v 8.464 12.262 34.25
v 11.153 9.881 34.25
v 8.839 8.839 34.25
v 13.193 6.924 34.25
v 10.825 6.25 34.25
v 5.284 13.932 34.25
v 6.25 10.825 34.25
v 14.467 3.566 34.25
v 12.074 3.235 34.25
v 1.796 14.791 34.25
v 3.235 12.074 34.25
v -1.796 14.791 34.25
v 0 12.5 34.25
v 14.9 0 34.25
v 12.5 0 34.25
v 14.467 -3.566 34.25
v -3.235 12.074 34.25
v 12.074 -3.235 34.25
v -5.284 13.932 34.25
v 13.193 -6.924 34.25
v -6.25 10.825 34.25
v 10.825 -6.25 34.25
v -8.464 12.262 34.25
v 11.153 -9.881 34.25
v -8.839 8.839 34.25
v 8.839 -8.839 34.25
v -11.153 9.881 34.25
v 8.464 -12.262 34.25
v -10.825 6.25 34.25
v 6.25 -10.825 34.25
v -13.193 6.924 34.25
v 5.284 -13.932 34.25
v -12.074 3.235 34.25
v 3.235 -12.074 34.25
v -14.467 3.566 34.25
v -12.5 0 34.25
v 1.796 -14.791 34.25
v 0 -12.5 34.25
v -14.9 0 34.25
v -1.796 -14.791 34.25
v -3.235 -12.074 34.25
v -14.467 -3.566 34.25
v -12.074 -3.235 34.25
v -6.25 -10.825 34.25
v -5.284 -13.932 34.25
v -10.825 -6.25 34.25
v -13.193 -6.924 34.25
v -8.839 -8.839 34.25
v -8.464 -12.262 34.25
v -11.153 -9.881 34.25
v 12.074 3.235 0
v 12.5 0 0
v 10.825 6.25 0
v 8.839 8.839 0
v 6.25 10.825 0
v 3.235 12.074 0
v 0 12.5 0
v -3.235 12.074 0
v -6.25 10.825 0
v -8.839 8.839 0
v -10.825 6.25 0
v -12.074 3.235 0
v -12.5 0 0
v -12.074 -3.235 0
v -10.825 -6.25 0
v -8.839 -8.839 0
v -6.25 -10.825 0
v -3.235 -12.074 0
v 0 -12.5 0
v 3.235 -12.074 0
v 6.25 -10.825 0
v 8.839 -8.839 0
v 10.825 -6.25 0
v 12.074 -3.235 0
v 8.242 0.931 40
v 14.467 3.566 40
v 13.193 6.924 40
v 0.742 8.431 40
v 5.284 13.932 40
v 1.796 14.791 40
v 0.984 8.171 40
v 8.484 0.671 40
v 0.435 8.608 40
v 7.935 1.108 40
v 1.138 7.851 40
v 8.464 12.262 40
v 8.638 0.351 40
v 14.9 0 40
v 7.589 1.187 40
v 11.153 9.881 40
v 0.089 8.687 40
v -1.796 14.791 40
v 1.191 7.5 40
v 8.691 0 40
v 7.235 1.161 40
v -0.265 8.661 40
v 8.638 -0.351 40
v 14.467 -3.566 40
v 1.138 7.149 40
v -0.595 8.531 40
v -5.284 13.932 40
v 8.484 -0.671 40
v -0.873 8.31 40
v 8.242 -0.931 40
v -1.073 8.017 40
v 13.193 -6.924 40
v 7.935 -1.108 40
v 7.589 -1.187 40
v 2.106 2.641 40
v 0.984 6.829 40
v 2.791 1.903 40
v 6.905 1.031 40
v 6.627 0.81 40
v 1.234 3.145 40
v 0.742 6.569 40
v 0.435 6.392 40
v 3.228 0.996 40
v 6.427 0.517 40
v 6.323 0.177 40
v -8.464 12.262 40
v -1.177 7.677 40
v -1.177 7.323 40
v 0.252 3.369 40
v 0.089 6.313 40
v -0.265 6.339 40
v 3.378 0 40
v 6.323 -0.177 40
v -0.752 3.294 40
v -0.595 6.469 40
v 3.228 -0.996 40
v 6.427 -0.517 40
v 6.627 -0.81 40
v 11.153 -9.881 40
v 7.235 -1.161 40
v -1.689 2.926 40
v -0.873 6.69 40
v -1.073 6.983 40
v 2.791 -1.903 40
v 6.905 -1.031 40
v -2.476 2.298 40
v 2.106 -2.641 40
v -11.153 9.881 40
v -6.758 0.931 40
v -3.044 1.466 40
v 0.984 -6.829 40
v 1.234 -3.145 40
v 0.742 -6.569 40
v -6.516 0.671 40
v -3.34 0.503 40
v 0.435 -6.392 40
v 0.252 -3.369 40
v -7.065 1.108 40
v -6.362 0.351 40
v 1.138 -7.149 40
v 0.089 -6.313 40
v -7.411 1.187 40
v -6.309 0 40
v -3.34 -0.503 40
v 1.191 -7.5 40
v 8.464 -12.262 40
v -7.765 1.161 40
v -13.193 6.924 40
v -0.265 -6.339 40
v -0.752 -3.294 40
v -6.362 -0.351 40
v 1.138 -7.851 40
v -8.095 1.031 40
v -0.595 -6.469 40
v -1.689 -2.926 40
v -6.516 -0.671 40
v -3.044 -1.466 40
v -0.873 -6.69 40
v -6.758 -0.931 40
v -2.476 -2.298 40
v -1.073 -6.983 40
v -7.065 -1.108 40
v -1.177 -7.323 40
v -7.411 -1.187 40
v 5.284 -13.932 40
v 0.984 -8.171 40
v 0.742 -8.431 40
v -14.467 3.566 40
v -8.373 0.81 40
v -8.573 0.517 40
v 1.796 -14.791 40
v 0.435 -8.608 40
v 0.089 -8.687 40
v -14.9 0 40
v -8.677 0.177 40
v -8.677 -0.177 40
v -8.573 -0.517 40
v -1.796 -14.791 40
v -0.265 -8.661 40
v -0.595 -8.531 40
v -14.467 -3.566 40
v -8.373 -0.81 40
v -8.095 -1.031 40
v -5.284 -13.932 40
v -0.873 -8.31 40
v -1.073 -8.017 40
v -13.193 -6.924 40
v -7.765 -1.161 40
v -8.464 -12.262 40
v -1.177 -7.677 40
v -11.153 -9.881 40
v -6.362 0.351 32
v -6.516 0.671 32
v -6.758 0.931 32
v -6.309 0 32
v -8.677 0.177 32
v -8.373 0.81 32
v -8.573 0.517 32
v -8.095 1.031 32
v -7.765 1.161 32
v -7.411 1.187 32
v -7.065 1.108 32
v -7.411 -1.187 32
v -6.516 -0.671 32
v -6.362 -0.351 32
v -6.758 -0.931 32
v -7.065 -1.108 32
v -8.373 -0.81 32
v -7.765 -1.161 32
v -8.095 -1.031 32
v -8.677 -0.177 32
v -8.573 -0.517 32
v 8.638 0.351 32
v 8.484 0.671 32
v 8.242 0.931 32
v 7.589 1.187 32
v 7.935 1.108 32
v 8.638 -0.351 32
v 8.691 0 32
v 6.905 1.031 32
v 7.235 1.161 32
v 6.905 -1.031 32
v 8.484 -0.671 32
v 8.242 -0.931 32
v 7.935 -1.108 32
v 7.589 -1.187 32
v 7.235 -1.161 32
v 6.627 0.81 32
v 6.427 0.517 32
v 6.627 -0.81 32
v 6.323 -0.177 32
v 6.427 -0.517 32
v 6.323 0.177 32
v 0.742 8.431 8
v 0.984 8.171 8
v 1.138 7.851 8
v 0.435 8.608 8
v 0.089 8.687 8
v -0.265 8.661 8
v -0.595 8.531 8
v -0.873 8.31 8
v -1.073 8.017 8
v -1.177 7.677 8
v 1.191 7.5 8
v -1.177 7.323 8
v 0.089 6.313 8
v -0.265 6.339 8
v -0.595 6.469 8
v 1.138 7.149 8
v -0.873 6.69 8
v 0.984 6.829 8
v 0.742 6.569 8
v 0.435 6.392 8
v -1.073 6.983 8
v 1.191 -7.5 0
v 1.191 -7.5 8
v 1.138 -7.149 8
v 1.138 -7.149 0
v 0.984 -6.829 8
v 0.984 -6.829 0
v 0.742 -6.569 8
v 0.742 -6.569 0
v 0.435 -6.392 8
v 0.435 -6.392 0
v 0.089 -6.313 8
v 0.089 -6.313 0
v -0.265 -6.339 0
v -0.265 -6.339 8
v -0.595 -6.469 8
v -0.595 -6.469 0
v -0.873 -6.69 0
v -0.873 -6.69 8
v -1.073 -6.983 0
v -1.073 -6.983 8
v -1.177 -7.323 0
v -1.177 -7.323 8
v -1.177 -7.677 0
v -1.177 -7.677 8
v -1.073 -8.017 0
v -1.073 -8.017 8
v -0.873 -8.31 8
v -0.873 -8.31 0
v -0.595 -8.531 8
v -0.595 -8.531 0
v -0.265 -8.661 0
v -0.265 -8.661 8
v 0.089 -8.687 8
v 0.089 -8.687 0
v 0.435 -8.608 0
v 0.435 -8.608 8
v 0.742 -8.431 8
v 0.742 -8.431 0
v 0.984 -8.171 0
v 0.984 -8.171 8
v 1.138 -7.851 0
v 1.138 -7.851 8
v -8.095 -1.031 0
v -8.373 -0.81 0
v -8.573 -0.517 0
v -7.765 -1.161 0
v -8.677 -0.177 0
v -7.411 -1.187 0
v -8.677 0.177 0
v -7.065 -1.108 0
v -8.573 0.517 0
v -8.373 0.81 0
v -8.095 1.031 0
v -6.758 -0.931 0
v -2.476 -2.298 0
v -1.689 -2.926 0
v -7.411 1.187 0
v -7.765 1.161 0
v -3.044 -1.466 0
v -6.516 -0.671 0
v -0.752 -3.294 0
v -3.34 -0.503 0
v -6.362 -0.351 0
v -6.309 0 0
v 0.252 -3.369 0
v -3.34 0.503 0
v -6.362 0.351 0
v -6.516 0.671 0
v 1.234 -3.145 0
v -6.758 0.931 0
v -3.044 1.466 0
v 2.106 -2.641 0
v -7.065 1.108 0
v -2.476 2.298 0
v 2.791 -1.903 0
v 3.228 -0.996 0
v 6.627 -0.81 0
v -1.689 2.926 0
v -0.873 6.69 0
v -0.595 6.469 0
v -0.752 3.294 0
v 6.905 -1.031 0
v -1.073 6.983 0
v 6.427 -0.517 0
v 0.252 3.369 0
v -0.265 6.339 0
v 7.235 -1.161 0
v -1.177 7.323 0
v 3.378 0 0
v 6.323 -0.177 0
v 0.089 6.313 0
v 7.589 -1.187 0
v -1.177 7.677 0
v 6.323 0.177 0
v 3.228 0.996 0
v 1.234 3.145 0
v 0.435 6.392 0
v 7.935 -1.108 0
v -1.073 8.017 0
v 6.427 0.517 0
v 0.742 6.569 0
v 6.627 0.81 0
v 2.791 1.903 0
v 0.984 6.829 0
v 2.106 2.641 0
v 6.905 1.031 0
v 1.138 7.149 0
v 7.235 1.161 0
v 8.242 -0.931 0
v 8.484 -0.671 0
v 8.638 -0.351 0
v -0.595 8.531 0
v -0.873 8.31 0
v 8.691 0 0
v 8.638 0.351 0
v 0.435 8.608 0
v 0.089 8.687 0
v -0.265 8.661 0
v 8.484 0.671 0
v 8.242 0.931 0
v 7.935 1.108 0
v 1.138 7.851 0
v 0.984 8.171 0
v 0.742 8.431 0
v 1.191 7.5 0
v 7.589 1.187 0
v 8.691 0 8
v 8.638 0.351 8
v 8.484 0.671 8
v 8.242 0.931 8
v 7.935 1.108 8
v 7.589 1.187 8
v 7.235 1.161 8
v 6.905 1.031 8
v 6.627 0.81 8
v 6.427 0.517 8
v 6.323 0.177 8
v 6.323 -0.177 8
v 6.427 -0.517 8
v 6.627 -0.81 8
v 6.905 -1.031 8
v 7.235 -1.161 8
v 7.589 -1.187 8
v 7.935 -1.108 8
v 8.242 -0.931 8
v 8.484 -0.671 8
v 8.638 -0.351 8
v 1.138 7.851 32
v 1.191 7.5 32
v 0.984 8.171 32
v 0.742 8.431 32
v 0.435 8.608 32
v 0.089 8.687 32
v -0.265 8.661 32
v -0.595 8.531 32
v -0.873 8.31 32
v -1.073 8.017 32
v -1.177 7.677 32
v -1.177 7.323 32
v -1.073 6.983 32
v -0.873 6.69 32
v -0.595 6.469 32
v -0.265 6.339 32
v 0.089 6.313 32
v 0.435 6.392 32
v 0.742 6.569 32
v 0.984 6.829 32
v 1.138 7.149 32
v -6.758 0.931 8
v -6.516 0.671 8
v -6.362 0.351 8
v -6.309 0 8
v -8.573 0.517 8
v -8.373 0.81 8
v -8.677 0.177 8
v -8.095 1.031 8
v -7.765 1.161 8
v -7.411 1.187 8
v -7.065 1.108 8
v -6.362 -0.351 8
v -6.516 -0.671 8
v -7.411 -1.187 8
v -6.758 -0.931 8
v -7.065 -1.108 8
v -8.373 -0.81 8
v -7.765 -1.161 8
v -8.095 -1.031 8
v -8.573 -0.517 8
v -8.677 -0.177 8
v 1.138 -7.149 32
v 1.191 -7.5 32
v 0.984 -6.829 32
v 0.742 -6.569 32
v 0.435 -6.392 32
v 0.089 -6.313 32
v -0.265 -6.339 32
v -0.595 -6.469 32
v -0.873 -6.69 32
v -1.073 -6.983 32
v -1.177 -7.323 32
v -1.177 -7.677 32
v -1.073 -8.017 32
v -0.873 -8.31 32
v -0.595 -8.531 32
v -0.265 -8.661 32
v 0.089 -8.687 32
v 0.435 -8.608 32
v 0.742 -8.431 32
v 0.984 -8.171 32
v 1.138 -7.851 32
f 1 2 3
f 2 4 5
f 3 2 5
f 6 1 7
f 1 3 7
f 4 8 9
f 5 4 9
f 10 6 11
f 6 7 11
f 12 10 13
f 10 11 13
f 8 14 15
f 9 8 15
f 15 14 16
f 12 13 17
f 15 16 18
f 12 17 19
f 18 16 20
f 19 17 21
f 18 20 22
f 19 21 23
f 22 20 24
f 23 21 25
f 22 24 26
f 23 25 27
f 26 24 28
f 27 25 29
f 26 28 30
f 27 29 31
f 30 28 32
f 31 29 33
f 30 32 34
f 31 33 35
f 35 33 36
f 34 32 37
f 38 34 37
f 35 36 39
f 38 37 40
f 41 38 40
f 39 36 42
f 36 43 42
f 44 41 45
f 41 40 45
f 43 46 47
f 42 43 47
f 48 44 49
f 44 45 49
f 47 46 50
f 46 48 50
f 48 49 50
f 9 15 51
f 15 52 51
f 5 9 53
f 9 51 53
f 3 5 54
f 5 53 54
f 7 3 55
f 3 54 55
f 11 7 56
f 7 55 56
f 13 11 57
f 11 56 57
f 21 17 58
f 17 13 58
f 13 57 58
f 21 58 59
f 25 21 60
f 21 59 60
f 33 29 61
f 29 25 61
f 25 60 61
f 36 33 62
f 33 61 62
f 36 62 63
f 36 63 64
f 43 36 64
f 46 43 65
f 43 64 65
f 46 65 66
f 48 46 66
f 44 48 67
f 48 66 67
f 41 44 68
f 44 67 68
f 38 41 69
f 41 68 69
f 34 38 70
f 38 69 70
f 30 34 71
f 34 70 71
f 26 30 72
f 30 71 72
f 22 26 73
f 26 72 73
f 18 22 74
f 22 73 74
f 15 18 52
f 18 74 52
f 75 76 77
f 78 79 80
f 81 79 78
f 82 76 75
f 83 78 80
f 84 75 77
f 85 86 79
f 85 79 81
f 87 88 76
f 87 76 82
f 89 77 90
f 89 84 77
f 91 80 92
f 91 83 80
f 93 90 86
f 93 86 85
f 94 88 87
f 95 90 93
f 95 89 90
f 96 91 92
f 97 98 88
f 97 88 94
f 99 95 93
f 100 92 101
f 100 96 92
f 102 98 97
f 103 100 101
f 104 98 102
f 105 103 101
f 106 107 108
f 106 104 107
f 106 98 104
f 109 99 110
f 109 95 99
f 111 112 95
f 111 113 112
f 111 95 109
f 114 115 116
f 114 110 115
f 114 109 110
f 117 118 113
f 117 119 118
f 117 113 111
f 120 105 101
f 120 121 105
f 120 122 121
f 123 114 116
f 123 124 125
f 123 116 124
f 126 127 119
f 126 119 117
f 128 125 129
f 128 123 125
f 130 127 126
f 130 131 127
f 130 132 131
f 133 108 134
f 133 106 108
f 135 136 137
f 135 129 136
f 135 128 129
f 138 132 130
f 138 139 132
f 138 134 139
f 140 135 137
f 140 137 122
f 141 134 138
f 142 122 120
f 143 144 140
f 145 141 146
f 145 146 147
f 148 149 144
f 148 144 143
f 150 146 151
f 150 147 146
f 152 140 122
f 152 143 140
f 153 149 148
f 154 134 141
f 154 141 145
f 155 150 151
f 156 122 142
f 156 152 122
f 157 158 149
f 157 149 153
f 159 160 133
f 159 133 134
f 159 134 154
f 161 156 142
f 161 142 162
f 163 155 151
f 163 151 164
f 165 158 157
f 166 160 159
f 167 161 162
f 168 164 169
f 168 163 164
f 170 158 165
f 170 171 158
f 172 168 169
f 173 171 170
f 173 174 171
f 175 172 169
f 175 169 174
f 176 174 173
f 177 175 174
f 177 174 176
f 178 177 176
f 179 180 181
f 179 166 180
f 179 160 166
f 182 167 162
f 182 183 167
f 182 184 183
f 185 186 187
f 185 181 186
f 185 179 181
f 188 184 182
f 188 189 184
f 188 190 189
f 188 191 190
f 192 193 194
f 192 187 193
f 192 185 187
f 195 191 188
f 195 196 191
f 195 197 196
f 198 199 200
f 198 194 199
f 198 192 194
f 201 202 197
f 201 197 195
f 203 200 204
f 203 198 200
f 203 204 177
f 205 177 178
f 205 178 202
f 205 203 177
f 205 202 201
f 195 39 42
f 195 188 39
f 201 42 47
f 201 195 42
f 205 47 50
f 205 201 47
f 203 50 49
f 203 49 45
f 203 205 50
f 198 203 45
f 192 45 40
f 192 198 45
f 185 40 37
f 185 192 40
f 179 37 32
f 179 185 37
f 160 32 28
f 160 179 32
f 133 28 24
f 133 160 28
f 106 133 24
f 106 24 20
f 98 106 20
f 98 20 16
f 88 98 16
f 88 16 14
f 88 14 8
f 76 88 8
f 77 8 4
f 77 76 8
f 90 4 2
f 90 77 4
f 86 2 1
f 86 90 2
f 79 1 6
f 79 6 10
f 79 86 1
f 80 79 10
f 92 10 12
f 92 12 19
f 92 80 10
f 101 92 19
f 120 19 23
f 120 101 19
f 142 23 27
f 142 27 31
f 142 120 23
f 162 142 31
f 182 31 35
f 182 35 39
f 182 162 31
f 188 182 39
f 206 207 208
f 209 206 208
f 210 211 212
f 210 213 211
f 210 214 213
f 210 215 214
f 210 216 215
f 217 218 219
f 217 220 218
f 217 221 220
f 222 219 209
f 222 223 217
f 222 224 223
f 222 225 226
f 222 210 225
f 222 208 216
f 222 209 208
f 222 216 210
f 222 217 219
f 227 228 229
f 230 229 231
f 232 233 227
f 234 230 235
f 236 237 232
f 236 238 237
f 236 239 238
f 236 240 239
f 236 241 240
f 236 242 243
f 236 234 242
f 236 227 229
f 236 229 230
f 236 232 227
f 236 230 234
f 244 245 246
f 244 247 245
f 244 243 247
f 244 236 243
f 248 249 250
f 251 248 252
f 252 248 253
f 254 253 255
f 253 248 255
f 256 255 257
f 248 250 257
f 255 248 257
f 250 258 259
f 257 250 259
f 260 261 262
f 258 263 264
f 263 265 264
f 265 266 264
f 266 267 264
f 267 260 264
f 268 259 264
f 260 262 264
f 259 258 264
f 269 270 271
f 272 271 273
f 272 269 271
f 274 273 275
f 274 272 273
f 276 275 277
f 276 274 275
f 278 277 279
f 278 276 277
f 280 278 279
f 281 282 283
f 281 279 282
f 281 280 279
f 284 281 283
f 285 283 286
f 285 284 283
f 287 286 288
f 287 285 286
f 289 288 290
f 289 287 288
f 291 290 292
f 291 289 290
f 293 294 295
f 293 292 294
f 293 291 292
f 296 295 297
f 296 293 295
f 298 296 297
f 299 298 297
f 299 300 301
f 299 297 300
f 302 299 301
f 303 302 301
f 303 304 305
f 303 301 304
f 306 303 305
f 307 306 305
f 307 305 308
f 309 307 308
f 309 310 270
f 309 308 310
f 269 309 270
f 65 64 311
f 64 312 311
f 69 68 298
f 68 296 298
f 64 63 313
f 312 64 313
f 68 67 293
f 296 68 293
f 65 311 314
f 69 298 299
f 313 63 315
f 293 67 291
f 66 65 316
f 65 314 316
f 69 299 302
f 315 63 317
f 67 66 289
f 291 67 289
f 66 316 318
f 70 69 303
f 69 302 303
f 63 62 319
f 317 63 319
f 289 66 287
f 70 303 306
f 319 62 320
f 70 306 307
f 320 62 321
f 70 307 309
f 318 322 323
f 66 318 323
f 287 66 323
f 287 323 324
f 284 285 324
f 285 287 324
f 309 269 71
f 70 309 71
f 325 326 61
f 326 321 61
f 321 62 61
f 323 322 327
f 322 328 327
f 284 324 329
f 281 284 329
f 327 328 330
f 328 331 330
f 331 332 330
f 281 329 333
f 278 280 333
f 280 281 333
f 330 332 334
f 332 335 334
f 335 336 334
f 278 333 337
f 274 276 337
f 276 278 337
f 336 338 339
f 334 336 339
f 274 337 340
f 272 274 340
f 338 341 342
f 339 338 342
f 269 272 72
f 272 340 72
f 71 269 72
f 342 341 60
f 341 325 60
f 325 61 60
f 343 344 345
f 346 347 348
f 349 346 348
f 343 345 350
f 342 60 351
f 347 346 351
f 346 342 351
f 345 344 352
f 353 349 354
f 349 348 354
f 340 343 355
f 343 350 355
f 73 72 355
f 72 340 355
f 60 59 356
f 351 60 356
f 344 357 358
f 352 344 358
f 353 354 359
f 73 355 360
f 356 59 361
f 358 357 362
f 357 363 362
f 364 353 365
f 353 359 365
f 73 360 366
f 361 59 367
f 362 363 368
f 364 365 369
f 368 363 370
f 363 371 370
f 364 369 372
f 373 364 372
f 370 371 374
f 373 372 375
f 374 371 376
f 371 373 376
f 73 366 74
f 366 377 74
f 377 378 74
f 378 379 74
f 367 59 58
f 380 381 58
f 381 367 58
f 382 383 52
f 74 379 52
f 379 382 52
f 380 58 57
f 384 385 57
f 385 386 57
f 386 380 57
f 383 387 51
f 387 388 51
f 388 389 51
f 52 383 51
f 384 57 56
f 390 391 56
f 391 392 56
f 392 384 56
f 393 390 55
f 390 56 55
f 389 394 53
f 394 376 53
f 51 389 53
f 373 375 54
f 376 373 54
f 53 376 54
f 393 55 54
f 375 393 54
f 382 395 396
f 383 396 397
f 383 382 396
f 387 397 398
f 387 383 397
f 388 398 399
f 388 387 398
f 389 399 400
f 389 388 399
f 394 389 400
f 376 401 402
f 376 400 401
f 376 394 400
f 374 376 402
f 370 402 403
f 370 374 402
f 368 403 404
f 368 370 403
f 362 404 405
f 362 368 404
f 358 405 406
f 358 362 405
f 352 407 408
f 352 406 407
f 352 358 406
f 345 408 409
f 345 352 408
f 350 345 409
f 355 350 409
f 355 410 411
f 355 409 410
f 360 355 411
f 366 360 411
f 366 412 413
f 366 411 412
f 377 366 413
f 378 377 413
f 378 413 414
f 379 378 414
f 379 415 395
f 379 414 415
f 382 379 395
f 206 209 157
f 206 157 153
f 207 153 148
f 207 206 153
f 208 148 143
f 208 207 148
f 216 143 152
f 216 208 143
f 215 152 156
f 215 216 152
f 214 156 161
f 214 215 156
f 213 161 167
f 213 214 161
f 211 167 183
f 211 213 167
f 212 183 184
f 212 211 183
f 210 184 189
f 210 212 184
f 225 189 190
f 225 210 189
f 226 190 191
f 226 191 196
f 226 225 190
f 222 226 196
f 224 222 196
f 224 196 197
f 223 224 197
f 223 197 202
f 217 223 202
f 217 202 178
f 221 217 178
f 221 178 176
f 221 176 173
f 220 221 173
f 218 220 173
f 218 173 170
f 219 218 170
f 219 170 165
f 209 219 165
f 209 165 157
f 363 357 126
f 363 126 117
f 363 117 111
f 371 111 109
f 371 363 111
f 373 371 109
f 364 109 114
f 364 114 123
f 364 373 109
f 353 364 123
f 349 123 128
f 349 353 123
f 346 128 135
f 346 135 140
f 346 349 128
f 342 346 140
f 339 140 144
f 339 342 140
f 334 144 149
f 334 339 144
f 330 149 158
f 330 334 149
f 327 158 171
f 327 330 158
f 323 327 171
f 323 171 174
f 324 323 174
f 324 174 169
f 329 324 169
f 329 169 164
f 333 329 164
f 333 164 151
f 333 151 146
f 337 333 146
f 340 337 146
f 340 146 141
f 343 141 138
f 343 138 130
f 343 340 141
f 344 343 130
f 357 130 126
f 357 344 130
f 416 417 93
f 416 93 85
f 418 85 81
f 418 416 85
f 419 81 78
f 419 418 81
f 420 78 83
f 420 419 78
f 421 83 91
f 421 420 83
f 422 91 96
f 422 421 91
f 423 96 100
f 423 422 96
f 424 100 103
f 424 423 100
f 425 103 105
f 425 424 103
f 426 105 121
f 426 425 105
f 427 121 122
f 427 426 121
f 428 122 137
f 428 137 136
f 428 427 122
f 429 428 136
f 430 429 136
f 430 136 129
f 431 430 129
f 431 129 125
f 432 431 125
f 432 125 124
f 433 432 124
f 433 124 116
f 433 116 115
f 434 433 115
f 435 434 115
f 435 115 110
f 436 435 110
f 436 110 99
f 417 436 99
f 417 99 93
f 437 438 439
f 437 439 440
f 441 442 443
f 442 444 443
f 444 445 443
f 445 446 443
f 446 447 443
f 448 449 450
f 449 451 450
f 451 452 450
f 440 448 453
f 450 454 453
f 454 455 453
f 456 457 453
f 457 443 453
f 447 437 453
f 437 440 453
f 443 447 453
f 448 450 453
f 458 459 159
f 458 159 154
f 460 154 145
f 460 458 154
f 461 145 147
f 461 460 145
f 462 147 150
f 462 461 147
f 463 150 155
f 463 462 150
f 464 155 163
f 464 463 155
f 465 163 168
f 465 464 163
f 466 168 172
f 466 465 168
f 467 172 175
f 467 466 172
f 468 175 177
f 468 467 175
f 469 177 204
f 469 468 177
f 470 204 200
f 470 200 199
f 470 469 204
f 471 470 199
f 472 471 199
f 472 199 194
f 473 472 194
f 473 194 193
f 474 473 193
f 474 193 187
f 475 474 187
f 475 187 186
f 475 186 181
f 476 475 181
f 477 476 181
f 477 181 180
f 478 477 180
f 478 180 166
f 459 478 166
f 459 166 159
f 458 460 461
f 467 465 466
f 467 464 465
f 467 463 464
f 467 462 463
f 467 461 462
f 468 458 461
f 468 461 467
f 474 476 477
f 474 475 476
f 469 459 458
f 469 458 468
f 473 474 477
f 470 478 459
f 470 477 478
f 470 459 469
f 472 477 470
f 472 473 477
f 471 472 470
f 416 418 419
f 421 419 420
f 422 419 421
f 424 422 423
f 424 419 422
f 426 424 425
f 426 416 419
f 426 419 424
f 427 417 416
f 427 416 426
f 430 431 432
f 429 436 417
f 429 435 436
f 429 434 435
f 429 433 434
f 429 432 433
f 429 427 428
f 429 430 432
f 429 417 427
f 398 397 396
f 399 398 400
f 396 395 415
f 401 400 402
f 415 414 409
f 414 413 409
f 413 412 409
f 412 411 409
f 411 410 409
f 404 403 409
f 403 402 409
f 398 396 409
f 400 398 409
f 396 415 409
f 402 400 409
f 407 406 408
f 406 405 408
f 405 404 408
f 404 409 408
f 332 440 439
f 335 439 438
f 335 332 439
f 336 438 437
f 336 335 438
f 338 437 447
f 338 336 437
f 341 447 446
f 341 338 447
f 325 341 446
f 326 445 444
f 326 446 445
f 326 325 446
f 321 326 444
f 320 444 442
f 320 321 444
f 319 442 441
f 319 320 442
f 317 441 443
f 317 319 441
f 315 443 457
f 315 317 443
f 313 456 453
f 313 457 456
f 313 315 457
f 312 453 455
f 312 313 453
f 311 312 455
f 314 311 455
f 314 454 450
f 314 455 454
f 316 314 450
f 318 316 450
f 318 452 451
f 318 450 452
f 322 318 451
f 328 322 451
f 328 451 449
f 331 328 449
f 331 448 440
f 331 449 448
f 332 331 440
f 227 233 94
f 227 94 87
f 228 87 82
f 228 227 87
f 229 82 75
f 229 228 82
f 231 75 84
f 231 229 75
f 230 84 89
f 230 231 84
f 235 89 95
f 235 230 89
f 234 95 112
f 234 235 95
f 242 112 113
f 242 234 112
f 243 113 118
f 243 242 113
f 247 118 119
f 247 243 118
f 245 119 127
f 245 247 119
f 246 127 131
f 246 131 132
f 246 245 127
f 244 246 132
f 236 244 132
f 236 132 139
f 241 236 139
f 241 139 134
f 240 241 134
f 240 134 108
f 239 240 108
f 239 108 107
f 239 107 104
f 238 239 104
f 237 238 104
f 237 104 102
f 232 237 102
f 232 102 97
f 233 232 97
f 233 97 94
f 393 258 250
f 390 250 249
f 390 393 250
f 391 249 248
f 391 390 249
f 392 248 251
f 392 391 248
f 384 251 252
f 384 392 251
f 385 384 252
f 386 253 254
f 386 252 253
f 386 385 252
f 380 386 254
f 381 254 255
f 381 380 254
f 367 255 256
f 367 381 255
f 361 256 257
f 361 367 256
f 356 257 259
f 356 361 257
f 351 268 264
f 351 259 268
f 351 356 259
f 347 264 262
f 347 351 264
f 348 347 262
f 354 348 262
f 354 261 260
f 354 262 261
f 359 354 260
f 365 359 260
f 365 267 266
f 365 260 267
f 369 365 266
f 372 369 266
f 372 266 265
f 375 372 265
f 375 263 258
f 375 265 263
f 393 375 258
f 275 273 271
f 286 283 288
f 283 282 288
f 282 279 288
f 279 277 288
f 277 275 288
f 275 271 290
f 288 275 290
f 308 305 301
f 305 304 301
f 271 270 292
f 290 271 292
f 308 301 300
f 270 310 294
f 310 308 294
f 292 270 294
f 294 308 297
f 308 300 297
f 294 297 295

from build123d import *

# Parameters (mm, degrees)
SKETCH1_R           = 12.5
SKETCH1_R_2         = 1.190625
SKETCH1_R_3         = 3.3782
BOSS_EXTRUDE1_DEPTH = 40
SKETCH2_W           = 7.5
SKETCH2_H           = 24
SKETCH2_W_2         = 2.4
SKETCH2_H_2         = 5.75


with BuildPart() as part:
    # Sketch1 → Boss-Extrude1 (new body)
    with BuildSketch(Plane(origin=(0, 0, 0), x_dir=(0, 1, 0), z_dir=(0, 0, 1))):
        with Locations(Location((0, 0, 0), (0, 0, 270))):
            Circle(SKETCH1_R)
        with Locations(Location((0, -7.5, 0), (0, 0, 270))):
            Circle(SKETCH1_R_2, mode=Mode.SUBTRACT)
        with Locations(Location((7.5, 0, 0), (0, 0, 270))):
            Circle(SKETCH1_R_2, mode=Mode.SUBTRACT)
        with Locations(Location((-7.5, 0, 0), (0, 0, 270))):
            Circle(SKETCH1_R_2, mode=Mode.SUBTRACT)
        with Locations(Location((0, 7.5, 0), (0, 0, 270))):
            Circle(SKETCH1_R_2, mode=Mode.SUBTRACT)
        with Locations(Location((0, 0, 0), (0, 0, 270))):
            Circle(SKETCH1_R_3, mode=Mode.SUBTRACT)
    extrude(amount=BOSS_EXTRUDE1_DEPTH)

    # Sketch2 → Revolve1 (revolve)
    with BuildSketch(Plane.YZ, mode=Mode.PRIVATE) as revolve1_sk:
        with Locations((-8.75, 20)):
            Rectangle(SKETCH2_W, SKETCH2_H)
        with Locations((-13.7, 37.125)):
            Rectangle(SKETCH2_W_2, SKETCH2_H_2)
    revolve(revolve1_sk.sketch.rotate(Axis((0, 0, 0), (0, 0, 1)), 270), axis=Axis((0, 0, 0), (0, 0, 1)))


solid = part.part
